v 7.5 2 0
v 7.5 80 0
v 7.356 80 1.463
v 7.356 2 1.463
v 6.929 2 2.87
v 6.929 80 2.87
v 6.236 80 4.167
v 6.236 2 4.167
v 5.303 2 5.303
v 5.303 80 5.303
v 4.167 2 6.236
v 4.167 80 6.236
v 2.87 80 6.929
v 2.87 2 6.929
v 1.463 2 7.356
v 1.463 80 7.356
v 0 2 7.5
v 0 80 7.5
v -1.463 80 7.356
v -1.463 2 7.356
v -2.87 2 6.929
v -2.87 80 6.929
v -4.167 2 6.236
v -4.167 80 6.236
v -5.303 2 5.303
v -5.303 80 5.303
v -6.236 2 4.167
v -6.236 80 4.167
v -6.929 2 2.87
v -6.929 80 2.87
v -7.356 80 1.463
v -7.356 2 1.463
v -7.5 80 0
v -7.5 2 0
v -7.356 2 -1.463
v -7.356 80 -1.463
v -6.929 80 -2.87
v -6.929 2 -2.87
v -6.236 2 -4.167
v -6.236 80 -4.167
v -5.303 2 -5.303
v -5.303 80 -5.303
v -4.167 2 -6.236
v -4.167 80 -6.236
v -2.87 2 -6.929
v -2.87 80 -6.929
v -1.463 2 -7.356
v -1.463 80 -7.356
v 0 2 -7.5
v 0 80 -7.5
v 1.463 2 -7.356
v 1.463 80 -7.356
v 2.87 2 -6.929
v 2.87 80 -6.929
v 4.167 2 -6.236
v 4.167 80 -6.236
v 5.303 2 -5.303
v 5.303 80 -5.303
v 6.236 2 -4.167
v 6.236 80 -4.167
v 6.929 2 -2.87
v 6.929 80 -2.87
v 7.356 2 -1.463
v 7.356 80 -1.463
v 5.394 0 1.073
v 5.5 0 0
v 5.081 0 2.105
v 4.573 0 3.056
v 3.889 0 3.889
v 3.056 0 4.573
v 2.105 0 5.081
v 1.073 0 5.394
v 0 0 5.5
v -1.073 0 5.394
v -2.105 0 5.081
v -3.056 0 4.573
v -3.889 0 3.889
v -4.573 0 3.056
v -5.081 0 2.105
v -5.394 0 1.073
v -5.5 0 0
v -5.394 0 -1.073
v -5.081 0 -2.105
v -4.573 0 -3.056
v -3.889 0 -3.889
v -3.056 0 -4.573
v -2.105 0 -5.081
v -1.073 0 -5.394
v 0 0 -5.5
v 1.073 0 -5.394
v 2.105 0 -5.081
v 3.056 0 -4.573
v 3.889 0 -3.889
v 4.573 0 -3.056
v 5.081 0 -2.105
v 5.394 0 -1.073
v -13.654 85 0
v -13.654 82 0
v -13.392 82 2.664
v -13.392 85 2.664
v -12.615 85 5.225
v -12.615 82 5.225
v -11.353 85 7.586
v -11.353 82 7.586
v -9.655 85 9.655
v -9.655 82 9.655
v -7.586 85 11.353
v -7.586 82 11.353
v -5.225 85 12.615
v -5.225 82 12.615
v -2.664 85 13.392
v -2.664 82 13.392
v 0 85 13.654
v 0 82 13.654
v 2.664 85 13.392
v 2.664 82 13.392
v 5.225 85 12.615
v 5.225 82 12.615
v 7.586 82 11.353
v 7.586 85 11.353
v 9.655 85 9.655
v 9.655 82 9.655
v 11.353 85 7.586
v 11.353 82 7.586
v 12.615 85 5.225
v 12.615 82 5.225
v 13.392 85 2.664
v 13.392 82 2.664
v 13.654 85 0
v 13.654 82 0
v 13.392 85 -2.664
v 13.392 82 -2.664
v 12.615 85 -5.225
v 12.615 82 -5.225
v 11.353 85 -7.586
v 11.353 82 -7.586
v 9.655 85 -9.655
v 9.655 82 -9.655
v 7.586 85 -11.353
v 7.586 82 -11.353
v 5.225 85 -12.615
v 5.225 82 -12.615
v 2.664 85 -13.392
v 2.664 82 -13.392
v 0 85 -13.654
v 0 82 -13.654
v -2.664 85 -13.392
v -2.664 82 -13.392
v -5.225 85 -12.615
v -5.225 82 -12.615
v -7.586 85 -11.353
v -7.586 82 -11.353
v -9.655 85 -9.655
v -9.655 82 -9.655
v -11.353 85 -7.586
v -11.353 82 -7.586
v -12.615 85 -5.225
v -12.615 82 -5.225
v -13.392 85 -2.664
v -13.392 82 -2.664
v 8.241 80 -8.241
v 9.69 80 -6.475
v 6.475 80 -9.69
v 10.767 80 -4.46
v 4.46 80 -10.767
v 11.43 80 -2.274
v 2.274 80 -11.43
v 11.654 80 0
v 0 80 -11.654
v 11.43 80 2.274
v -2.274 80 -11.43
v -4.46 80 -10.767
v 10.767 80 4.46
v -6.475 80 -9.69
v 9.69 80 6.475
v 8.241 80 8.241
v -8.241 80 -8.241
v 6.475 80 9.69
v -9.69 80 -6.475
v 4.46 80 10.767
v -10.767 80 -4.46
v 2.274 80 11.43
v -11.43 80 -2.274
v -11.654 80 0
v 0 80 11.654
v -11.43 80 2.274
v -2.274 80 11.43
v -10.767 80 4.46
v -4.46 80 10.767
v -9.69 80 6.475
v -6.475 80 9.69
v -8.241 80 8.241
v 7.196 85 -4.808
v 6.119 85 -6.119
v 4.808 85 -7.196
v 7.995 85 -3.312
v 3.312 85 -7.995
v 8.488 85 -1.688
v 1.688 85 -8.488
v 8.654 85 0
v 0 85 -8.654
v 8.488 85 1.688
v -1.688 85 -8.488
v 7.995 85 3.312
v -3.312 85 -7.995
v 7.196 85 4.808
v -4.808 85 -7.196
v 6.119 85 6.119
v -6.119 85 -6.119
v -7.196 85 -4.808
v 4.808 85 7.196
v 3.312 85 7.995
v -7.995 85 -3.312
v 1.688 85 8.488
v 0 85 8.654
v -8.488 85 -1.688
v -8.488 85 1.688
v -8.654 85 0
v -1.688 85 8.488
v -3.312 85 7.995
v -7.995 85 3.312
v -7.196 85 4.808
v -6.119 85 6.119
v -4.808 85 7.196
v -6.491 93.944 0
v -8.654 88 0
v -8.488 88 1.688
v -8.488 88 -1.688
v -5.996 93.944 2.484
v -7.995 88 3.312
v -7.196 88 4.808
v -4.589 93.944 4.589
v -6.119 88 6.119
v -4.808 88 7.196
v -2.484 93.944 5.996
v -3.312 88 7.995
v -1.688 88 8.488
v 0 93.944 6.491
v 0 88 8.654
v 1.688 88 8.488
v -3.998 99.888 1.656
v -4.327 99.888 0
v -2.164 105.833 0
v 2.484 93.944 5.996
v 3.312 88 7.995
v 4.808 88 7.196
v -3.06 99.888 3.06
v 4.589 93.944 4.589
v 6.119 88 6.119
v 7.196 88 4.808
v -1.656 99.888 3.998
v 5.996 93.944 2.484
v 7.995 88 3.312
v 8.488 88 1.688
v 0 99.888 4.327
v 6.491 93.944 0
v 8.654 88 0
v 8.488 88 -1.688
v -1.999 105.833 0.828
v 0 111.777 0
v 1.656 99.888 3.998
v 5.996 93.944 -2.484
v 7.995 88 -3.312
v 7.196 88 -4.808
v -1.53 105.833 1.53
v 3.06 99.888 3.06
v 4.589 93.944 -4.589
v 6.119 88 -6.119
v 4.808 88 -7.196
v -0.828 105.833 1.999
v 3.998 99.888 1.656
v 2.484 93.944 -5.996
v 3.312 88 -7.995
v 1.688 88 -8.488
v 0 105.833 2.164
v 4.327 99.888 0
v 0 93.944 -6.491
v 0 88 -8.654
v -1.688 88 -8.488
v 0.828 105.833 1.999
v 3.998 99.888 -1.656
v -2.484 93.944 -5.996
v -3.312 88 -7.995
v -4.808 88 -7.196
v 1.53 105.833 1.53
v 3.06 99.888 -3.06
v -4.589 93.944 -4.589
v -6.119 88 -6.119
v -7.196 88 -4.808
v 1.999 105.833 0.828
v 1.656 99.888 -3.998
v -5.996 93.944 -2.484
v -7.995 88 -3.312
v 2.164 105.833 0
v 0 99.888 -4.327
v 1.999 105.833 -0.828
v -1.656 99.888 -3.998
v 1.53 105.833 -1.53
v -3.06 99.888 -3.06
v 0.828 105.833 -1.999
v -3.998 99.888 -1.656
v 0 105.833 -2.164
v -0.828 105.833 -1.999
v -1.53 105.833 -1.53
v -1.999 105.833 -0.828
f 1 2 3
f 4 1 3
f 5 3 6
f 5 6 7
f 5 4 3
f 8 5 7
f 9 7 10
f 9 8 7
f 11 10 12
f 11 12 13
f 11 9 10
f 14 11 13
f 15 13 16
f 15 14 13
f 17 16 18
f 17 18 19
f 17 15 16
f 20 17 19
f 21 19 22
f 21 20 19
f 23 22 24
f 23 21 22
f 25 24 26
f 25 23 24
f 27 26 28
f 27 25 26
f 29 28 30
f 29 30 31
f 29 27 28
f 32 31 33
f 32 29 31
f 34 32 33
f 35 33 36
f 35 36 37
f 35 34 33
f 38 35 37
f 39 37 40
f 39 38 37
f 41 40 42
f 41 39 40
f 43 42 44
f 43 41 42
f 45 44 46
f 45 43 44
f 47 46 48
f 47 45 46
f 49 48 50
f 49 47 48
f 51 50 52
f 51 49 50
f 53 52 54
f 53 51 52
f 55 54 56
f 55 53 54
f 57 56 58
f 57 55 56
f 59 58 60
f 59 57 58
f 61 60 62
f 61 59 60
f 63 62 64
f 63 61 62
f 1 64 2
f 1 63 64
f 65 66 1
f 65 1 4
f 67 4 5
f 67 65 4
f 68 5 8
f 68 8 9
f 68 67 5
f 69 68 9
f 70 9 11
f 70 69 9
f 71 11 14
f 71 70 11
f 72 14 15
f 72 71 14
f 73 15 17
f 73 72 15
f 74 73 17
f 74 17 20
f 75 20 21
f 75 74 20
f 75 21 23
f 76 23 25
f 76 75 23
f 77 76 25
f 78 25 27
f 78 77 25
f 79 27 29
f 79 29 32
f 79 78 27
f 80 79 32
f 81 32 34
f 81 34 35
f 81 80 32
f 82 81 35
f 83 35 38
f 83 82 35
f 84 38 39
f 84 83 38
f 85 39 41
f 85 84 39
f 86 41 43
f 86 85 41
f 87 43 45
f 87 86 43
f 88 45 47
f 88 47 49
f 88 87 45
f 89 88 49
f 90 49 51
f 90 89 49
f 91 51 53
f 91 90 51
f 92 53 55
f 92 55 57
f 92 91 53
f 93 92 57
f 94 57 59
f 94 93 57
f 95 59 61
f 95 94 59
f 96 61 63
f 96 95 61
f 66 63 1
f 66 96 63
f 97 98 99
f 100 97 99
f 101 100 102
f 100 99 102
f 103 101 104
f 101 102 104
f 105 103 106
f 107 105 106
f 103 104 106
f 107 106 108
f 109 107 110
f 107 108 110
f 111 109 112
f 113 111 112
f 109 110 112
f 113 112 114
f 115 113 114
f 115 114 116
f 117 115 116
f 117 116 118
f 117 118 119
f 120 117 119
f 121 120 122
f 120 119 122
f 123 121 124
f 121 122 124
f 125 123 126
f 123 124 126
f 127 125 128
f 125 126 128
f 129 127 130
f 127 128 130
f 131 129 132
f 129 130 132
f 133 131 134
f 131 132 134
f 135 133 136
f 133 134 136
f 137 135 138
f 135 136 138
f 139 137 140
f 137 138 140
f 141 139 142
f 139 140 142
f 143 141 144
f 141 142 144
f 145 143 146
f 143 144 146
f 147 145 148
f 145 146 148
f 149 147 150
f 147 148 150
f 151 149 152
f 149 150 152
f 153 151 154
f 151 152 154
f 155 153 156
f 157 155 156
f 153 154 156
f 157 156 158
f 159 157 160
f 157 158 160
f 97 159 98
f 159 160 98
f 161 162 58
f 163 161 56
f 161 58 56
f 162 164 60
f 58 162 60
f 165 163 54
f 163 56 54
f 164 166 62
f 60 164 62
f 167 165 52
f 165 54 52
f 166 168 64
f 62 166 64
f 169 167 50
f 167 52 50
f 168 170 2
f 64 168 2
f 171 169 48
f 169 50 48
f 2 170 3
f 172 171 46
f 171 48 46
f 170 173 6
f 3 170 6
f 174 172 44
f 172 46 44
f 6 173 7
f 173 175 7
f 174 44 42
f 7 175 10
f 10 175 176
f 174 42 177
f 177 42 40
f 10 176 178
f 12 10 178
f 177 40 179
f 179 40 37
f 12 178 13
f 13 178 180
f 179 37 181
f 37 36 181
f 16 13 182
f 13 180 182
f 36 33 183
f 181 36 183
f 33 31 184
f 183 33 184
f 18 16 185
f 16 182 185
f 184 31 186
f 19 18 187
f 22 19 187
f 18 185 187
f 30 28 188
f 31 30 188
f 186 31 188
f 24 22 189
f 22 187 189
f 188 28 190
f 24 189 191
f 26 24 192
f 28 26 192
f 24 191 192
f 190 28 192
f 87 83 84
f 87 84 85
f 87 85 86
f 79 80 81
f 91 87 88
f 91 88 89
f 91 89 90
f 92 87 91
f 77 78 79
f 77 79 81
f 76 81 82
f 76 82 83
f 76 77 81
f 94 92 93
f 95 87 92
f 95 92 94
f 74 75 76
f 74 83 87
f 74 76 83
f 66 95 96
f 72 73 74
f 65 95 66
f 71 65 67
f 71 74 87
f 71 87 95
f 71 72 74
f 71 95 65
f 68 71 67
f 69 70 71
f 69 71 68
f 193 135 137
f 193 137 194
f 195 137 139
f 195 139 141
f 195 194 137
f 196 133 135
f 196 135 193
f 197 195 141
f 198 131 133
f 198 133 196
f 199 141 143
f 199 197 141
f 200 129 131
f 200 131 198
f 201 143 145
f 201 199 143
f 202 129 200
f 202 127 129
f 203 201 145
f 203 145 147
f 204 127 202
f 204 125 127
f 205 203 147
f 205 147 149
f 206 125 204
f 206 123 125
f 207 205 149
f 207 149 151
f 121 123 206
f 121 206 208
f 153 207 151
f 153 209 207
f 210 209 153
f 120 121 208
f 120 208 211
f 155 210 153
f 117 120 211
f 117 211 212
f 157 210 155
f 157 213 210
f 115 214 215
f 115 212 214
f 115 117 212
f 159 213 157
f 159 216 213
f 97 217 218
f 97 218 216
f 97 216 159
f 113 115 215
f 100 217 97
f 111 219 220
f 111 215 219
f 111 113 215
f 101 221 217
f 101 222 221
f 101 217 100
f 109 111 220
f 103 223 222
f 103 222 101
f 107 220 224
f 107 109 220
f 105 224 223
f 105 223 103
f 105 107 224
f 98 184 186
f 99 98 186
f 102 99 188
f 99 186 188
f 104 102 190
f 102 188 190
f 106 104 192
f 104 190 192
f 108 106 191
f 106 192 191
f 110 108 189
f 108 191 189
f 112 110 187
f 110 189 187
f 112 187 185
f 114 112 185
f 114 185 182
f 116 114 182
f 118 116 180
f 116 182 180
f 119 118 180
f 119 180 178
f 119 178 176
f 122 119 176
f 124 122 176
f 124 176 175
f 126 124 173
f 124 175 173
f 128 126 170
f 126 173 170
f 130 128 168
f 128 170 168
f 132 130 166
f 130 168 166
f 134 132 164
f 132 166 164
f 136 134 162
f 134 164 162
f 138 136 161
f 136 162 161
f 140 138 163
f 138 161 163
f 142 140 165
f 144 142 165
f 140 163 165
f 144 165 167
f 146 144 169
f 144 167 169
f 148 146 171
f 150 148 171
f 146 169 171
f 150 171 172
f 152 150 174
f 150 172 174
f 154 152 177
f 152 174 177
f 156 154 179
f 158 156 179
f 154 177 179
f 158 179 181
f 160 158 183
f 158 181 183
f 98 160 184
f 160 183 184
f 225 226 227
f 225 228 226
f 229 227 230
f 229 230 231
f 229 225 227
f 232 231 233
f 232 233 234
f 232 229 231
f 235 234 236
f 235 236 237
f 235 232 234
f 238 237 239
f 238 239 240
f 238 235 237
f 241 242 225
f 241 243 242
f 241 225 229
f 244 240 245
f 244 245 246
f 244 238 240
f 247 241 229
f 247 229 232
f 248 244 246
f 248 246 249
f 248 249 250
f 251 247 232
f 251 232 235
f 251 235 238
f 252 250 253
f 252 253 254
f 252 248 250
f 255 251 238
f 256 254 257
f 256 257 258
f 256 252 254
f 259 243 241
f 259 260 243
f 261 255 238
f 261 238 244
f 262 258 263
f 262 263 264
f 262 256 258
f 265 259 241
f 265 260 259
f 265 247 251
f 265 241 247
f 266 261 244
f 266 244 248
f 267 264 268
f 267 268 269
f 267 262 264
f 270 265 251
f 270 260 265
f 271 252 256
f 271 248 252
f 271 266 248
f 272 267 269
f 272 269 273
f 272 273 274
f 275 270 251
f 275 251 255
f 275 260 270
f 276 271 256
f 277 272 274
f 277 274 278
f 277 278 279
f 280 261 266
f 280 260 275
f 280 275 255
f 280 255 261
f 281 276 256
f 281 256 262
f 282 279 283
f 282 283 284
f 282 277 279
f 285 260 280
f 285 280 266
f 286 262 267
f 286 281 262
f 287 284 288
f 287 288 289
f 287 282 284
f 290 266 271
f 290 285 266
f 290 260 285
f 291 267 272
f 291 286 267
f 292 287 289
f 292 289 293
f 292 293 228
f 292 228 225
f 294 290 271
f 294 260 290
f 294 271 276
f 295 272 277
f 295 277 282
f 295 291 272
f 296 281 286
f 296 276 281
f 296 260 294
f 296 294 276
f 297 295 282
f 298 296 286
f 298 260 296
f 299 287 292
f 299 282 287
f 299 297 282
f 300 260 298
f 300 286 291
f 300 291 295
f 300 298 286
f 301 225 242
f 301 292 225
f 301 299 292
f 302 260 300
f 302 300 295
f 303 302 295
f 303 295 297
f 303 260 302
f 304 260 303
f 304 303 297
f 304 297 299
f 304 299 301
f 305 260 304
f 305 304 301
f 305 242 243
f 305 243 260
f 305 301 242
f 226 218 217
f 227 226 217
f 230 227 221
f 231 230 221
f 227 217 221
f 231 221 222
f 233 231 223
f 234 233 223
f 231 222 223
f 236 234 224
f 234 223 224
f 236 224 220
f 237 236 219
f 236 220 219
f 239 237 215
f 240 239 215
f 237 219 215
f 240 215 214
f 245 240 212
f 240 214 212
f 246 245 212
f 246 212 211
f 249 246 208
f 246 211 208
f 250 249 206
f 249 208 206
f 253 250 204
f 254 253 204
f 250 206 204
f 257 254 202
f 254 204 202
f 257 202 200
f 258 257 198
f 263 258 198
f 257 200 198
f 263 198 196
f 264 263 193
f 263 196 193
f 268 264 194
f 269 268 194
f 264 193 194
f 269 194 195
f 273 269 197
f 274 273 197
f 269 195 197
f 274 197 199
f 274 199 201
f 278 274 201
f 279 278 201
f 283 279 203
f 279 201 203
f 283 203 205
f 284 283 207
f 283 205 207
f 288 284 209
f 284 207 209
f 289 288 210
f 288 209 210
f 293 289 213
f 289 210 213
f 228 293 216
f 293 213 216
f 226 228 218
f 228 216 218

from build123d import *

# Parameters (mm, degrees)
F0_R      = 7.5
F1_DEPTH  = 80
F2_R      = 13.654
F3_DEPTH  = 5
F4_R      = 8.6540002376
F5_DEPTH  = 3
F5_FACE_R = 8.6540002376
F7_SIZE   = 2


# Not quite as in the source:
# - an extrude whose draft closes it to a point is written as a loft to that point


with BuildPart() as f1:
    # F0 (on Front) → F1 (new body)
    with BuildSketch(Plane.XZ):
        Circle(F0_R)
    extrude(amount=-F1_DEPTH)

    # F2 (on face) → F3 (join)
    with BuildSketch(Plane(origin=(0, 80, 0), x_dir=(-1, 0, 0), z_dir=(0, 1, 0))):
        Circle(F2_R)
    extrude(amount=F3_DEPTH)

    # F4 (on face) → F5 (join)
    with BuildSketch(Plane(origin=(0, 85, 0), x_dir=(-1, 0, 0), z_dir=(0, 1, 0))):
        Circle(F4_R)
    extrude(amount=F5_DEPTH)

    # F5_face (on face) → F6 section 0
    with BuildSketch(Plane(origin=(0, 88, 0), x_dir=(-1, 0, 0), z_dir=(0, 1, 0)), mode=Mode.PRIVATE) as f6_s0:
        Circle(F5_FACE_R)
    loft([f6_s0.sketch, Vertex(0, 111.7766702407, 0)], ruled=True)

    # F7
    f7_edges = [f1.edges().sort_by_distance(p)[0] for p in [
        (-7.5, 0, 0),
        (13.654, 80, 0),
    ]]
    chamfer(f7_edges, length=F7_SIZE)


solid = f1.part
